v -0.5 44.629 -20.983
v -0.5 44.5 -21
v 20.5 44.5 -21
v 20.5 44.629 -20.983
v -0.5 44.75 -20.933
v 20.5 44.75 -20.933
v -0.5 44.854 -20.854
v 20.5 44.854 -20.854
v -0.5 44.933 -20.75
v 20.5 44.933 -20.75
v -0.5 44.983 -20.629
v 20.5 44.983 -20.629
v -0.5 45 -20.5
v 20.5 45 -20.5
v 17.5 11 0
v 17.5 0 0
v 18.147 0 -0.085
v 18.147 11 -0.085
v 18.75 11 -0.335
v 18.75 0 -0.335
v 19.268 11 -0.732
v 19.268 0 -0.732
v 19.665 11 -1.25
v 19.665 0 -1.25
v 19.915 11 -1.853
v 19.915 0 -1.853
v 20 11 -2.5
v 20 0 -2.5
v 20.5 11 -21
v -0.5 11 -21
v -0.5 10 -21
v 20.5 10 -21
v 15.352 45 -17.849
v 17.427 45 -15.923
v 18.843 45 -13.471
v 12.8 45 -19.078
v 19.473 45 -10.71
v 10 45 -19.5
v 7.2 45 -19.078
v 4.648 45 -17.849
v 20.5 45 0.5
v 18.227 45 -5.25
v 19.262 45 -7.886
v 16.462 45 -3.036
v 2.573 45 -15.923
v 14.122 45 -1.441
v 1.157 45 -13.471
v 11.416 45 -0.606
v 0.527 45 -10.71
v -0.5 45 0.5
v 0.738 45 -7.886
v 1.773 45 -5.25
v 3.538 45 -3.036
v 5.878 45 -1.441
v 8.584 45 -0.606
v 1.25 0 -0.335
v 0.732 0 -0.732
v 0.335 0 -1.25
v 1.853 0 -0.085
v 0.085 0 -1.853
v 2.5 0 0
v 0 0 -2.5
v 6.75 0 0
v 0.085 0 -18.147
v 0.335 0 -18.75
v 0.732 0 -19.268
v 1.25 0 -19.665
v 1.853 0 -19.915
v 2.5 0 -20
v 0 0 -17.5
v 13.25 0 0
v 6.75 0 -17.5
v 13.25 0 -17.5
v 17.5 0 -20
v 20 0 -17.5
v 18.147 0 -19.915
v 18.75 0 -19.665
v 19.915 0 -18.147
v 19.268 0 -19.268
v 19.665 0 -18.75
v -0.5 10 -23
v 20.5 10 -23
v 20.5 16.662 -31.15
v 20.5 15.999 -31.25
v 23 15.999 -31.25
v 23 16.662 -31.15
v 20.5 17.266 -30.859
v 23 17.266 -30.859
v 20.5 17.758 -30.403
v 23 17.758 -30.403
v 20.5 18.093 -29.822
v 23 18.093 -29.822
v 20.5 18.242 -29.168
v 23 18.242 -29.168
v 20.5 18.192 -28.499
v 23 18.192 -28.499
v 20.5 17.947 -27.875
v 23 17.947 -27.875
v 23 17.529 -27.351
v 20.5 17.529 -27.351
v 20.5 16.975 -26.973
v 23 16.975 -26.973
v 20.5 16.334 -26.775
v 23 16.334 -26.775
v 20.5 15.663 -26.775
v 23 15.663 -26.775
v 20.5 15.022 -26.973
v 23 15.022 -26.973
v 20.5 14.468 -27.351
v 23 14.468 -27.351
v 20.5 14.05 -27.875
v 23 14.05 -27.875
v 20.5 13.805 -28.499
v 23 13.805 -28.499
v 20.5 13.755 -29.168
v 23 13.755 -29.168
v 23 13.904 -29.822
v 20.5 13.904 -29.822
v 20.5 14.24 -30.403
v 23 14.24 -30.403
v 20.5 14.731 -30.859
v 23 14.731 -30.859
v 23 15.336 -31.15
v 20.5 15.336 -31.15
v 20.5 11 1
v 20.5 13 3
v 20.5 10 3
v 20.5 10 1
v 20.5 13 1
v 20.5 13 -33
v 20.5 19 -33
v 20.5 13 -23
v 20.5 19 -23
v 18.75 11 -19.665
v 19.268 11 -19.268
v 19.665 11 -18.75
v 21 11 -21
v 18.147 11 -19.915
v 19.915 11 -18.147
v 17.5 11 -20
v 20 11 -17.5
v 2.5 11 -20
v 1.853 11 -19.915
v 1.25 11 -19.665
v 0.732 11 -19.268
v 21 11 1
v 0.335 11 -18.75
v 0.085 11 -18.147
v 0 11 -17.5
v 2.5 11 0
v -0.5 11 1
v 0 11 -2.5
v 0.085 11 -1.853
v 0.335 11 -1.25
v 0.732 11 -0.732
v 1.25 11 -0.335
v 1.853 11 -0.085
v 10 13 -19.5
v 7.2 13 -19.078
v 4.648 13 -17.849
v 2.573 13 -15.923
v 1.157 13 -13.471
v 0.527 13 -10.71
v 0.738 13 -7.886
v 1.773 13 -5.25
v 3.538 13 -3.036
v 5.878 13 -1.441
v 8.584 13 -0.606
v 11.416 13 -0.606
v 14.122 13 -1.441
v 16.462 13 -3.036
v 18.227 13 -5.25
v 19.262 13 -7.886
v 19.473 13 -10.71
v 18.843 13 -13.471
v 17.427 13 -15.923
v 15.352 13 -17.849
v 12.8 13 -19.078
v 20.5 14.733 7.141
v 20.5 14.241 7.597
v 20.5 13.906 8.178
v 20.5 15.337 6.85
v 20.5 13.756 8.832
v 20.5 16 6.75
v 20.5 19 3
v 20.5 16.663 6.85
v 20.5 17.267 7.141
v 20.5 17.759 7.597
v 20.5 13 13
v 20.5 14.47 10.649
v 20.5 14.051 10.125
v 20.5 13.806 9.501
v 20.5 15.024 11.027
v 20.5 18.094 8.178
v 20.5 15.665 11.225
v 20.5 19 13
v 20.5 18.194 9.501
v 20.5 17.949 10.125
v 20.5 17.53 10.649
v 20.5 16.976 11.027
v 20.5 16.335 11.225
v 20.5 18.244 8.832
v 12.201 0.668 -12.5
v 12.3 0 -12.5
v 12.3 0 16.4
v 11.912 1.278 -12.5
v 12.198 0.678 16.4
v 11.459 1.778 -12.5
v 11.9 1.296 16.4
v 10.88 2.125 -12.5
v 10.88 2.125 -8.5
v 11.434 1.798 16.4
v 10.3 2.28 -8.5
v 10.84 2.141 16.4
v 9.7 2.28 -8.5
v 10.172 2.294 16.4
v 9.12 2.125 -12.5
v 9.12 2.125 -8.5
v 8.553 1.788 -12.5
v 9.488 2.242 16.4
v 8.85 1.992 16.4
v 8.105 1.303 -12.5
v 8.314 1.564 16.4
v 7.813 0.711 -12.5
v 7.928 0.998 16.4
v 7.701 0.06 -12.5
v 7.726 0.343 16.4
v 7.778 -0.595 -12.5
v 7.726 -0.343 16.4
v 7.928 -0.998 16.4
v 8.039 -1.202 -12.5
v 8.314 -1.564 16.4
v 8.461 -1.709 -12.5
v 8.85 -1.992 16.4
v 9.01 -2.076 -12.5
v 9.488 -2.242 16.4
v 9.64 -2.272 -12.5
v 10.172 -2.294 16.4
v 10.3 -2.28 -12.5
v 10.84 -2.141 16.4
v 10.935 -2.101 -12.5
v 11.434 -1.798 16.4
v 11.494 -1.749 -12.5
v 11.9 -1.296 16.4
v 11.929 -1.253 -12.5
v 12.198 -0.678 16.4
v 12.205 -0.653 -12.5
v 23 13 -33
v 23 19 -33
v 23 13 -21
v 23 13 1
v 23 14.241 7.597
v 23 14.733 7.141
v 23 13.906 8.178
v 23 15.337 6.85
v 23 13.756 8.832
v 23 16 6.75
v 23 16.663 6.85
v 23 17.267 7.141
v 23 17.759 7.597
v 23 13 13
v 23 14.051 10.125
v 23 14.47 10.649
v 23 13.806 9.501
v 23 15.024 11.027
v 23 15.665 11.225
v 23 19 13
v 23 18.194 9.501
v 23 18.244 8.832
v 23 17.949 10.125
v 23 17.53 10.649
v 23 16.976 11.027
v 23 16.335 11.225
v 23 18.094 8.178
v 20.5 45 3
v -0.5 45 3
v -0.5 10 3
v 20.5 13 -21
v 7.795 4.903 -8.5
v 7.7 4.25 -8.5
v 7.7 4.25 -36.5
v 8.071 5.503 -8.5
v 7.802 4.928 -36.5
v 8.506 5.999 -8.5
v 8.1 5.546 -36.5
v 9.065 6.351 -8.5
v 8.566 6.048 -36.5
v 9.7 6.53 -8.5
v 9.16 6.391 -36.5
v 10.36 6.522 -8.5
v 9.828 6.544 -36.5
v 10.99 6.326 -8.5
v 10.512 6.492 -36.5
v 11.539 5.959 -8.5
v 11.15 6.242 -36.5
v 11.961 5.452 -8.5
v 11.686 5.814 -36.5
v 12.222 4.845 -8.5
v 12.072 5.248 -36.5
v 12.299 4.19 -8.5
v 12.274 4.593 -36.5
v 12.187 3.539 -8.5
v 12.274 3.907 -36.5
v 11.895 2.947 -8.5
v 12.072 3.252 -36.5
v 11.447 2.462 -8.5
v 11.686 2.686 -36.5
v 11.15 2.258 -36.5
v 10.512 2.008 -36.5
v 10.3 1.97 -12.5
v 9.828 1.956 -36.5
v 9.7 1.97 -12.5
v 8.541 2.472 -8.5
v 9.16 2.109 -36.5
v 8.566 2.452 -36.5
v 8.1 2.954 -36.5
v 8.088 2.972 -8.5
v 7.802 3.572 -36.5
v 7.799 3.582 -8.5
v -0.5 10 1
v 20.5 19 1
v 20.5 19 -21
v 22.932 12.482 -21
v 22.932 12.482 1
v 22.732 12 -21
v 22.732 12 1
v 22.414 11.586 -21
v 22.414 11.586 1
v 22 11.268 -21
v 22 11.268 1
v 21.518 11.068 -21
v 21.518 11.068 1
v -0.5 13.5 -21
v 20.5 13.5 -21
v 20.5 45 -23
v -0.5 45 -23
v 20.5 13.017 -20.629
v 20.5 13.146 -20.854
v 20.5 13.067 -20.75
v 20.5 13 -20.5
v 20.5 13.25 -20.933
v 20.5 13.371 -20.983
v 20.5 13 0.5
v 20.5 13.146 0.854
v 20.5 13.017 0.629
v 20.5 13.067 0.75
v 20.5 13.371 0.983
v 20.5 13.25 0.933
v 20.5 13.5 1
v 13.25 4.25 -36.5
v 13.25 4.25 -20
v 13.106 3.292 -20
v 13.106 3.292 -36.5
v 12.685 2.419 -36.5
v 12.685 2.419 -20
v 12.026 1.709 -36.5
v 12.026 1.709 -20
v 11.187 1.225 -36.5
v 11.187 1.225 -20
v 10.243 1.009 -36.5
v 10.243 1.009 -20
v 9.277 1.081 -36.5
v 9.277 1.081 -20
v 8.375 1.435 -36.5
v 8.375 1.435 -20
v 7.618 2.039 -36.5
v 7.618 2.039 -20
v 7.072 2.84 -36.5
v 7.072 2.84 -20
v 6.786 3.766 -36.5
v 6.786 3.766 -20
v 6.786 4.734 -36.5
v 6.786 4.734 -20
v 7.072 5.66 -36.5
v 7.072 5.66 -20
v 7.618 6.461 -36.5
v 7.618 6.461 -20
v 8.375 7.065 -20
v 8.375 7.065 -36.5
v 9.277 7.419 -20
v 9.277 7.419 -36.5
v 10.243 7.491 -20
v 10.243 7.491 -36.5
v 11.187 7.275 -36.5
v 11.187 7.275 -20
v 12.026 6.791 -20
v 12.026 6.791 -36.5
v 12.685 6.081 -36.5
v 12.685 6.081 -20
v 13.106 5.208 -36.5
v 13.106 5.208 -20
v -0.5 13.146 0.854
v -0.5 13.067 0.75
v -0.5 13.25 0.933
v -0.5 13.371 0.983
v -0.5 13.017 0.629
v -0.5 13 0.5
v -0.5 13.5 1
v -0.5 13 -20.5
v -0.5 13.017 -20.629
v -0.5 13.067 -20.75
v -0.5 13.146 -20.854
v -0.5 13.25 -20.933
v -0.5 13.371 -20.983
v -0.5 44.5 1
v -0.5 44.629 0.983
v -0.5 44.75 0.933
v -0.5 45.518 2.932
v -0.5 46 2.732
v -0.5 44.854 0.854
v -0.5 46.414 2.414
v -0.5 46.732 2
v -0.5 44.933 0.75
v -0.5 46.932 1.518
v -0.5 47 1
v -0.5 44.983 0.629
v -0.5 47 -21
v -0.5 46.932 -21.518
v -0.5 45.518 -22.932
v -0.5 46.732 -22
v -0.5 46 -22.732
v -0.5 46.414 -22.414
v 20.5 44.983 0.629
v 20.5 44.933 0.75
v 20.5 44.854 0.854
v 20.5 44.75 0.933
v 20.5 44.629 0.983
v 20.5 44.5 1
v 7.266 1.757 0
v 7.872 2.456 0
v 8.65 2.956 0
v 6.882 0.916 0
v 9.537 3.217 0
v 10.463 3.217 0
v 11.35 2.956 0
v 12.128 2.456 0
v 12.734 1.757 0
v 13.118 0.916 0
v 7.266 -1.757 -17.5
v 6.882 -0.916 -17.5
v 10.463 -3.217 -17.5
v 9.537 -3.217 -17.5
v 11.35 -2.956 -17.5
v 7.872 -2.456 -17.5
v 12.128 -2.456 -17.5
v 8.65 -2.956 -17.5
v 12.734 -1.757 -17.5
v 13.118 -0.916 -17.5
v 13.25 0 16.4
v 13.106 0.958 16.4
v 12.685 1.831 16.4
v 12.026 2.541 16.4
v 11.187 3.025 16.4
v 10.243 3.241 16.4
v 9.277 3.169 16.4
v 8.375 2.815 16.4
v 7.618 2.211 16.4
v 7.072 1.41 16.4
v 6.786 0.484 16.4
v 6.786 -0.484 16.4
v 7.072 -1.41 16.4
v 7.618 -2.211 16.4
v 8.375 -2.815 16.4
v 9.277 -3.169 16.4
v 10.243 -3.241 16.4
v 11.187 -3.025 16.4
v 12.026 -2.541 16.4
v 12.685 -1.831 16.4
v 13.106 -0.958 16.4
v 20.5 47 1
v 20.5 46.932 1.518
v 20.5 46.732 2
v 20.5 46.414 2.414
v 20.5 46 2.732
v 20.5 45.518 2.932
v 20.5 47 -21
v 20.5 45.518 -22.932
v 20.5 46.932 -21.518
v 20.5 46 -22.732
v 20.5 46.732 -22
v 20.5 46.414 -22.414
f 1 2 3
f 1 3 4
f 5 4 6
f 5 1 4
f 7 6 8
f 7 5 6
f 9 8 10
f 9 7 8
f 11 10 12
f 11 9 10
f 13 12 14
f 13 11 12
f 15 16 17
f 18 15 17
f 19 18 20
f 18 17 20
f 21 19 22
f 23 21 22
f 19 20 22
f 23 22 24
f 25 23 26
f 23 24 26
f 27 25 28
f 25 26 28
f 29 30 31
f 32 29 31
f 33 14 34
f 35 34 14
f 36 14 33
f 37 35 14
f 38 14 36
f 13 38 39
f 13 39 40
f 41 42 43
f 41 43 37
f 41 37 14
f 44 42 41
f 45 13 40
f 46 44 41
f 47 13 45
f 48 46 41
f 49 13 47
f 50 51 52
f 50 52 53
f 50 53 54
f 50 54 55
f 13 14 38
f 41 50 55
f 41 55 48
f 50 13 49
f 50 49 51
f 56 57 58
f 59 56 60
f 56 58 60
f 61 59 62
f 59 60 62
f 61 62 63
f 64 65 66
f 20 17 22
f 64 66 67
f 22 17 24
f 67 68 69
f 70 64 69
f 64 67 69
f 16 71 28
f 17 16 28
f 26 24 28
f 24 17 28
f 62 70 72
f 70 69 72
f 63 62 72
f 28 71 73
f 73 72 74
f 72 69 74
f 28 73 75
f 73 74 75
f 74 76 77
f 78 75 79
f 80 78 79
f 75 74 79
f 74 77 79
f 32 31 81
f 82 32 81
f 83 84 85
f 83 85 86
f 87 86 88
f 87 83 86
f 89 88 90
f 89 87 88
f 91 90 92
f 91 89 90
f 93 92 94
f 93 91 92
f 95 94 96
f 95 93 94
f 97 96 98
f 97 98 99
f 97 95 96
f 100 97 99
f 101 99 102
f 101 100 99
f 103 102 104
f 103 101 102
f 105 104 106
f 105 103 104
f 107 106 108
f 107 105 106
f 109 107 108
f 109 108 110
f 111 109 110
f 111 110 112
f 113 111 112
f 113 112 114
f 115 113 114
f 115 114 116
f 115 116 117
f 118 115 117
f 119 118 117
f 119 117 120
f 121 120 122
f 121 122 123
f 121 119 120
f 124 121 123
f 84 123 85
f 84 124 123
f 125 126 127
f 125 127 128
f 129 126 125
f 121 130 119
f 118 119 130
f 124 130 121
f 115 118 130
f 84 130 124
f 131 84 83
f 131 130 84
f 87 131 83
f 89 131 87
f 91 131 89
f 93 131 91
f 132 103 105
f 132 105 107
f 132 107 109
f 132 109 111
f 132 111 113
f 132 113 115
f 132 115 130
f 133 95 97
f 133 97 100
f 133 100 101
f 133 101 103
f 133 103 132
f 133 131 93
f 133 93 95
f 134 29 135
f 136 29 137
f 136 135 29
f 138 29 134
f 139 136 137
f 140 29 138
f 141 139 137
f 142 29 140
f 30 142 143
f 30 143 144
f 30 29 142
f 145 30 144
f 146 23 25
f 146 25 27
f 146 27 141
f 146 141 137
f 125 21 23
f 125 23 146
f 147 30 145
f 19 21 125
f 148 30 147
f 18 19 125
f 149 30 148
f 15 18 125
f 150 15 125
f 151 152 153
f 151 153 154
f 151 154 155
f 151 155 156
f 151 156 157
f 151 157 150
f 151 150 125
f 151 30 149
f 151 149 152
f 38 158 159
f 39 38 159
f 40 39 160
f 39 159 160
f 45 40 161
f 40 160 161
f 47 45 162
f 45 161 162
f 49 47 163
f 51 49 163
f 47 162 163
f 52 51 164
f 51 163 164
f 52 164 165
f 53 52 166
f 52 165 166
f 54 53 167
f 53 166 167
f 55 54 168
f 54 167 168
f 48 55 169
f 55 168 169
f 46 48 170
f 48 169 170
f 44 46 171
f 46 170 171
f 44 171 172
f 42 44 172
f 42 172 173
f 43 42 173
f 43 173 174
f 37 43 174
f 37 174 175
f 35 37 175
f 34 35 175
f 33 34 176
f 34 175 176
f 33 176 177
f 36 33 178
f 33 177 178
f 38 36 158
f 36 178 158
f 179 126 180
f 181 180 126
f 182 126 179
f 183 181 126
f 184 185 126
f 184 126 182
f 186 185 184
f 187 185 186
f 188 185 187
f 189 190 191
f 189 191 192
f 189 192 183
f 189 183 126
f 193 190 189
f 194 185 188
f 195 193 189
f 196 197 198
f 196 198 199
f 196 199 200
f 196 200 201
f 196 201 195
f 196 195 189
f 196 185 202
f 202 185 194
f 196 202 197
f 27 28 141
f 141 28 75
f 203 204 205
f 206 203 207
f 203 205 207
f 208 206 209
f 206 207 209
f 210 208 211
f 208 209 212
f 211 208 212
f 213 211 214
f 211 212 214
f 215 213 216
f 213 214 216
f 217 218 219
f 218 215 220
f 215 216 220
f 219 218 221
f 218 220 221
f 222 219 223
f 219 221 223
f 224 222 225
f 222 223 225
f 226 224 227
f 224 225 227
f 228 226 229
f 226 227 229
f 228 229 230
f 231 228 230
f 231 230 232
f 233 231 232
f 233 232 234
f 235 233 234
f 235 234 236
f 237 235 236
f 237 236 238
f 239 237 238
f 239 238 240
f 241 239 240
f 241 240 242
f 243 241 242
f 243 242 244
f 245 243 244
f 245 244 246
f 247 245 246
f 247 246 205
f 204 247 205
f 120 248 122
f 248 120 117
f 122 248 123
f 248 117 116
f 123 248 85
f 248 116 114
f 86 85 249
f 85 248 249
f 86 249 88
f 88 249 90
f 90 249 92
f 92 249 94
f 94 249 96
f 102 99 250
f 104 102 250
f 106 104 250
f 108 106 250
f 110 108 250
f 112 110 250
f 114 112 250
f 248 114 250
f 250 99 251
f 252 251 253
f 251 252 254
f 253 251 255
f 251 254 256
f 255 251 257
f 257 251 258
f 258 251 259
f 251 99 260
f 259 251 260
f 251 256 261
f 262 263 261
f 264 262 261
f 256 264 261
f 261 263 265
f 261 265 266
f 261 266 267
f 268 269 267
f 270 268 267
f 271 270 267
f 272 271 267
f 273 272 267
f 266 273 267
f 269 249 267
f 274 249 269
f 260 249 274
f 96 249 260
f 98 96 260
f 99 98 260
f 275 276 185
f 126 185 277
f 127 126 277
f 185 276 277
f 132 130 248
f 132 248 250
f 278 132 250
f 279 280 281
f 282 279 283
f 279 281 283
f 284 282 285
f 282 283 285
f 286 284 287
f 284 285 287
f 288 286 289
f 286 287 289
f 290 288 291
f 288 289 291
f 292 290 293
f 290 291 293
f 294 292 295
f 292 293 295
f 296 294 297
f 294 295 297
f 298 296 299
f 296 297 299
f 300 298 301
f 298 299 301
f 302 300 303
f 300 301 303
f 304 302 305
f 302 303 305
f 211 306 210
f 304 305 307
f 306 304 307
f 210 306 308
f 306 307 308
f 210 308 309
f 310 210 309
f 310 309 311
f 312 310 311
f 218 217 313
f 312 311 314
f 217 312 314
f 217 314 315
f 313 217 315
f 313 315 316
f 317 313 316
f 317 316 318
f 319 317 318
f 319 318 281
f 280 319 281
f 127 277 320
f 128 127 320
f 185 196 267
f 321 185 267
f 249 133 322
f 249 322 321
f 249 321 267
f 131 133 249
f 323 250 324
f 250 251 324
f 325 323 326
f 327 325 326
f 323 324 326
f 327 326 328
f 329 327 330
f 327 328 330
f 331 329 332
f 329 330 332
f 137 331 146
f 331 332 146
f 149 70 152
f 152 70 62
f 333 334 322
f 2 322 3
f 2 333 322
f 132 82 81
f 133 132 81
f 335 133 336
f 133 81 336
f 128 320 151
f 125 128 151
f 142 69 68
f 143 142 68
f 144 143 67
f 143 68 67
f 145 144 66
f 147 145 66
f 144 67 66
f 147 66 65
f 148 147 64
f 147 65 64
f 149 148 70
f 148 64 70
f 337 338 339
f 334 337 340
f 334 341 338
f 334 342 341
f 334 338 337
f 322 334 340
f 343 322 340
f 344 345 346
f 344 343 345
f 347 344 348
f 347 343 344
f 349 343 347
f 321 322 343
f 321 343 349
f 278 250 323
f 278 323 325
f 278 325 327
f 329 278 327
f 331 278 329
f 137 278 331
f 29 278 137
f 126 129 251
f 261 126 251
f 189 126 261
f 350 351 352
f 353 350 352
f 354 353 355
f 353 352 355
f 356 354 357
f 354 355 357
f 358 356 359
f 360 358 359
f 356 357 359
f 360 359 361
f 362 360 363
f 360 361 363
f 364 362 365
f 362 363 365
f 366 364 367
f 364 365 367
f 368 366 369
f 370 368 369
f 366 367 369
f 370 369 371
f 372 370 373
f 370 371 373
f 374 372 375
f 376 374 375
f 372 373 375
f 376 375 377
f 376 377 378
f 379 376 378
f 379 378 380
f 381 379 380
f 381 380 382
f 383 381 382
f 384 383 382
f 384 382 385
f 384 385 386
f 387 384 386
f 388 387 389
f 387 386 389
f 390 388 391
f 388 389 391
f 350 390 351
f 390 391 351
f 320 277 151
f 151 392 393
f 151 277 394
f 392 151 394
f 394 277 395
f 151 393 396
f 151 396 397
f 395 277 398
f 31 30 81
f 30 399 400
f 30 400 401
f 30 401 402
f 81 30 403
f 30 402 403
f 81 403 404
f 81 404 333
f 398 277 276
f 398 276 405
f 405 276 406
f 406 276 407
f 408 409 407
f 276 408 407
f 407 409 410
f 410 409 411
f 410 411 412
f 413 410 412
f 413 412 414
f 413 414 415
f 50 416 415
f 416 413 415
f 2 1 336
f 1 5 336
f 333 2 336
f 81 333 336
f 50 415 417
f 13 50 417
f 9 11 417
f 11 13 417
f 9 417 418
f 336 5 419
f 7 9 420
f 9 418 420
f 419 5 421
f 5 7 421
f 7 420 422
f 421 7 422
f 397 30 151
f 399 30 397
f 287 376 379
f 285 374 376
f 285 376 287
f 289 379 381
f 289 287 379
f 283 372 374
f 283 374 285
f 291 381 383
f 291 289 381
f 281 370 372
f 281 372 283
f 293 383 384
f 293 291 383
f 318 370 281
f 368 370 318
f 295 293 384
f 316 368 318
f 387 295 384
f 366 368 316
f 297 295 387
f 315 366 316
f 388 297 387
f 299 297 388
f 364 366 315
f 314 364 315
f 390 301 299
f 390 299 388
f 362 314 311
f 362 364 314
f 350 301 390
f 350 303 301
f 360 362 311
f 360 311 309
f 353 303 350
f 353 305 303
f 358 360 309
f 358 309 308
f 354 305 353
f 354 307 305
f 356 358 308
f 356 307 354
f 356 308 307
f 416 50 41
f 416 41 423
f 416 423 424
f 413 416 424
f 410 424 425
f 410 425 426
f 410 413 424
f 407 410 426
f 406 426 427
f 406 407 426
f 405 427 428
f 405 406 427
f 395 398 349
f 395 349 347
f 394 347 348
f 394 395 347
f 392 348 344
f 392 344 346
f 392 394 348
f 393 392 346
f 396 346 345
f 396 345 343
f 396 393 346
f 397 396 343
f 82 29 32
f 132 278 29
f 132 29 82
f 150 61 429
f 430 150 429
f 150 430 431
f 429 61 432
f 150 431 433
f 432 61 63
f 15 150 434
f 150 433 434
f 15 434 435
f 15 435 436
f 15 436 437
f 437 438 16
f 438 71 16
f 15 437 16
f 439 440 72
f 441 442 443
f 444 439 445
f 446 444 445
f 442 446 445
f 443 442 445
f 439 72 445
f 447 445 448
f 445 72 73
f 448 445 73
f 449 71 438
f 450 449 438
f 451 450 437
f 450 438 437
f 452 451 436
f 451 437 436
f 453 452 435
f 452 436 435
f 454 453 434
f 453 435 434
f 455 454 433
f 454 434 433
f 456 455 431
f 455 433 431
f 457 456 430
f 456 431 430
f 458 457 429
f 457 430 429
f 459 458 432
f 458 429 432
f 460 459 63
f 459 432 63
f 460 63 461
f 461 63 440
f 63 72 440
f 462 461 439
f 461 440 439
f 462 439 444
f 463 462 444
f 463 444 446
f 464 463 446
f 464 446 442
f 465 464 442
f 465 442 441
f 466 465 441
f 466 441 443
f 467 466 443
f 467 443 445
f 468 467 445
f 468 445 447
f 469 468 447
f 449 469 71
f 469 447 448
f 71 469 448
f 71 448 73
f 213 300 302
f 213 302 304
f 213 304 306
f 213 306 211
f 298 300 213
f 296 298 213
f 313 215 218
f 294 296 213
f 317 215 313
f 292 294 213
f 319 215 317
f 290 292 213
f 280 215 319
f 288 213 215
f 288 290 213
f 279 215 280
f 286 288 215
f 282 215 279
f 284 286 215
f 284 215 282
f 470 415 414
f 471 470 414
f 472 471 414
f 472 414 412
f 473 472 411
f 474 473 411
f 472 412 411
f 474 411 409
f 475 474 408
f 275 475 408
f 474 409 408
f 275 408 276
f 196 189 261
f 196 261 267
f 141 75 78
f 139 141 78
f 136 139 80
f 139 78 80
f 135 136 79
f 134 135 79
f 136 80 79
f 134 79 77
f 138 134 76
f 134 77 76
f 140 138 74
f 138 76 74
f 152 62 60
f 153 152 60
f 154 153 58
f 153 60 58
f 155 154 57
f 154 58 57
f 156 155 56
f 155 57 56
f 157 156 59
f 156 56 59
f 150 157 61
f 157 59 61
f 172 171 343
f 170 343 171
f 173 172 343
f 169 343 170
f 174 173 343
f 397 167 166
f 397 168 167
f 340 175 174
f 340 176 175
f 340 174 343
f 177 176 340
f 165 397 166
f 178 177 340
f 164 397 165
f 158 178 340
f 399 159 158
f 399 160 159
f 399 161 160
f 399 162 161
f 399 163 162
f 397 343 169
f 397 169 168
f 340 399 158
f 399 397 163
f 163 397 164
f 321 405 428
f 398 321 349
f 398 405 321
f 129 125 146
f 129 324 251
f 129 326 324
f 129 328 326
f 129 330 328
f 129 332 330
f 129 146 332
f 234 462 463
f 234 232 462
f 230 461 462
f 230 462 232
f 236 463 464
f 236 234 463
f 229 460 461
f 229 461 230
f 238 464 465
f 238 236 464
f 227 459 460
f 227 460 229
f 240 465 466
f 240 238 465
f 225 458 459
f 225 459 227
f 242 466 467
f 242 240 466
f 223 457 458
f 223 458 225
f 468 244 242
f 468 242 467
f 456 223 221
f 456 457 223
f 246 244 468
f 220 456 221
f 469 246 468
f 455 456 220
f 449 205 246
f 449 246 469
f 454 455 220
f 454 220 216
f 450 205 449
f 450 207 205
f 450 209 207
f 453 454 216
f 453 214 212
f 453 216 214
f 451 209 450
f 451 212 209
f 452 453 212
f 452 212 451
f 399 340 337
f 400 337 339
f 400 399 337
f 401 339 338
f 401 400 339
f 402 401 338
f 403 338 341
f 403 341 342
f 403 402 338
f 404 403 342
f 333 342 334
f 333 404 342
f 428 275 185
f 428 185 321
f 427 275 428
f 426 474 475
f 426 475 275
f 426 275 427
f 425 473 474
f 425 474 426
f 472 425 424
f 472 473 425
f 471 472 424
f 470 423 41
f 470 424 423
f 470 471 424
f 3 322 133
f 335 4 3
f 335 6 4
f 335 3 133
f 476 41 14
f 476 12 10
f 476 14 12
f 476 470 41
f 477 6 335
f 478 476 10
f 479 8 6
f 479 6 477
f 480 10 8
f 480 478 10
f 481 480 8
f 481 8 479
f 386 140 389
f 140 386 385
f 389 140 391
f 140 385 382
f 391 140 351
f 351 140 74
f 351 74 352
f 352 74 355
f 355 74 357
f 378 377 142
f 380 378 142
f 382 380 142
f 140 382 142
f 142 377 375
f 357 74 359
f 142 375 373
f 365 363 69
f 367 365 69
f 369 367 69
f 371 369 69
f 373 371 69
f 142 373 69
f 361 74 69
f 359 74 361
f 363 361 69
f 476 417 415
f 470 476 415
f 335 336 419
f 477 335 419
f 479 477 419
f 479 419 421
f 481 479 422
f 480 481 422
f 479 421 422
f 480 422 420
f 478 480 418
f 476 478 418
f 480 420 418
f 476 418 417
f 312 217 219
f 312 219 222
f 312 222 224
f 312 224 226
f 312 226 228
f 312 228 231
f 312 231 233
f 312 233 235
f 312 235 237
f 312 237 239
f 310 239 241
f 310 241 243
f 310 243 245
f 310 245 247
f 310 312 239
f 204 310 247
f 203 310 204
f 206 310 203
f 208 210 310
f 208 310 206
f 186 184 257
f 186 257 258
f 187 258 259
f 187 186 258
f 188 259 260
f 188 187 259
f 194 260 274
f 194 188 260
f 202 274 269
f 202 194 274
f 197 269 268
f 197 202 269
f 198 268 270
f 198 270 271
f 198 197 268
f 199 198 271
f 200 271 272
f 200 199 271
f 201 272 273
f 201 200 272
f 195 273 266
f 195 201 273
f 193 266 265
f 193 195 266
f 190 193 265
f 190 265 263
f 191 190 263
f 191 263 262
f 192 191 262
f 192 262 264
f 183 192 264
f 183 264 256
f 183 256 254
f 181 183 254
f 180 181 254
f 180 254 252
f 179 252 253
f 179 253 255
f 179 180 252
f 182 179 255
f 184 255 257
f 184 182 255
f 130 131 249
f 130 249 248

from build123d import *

# Parameters (mm, degrees)
BOSS_EXTRUDE1_DEPTH      = 11
BOSS_EXTRUDE2_DEPTH      = 16.4
BOSS_EXTRUDE2_DEPTH_BACK = 17.5
SKETCH2_R                = 3.25
SKETCH3_R                = 2.3
CUT_EXTRUDE1_DEPTH       = 28.9
SKETCH4_R                = 3.25
BOSS_EXTRUDE3_DEPTH      = 16.5
SKETCH5_R                = 2.3
CUT_EXTRUDE2_DEPTH       = 28
BOSS_EXTRUDE4_START      = -20.5
BOSS_EXTRUDE4_DEPTH      = 21
SKETCH8_R                = 9.5
BOSS_EXTRUDE5_DEPTH      = 32
SKETCH10_R               = 2.25
BOSS_EXTRUDE6_DEPTH      = 2.5
FILLET1_R                = 2


with BuildPart() as part:
    # Sketch1 → Boss-Extrude1 (new body)
    with BuildSketch(Plane(origin=(0, 0, 0), x_dir=(1, 0, 0), z_dir=(0, 1, 0))):
        with BuildLine():
            Line((2.5, 0), (17.5, 0))
            ThreePointArc((17.5, 0), (19.267766953, 0.732233047), (20, 2.5))
            Line((20, 2.5), (20, 17.5))
            ThreePointArc((20, 17.5), (19.267766953, 19.267766953), (17.5, 20))
            Line((17.5, 20), (2.5, 20))
            ThreePointArc((2.5, 20), (0.732233047, 19.267766953), (0, 17.5))
            Line((0, 17.5), (0, 2.5))
            ThreePointArc((0, 2.5), (0.732233047, 0.732233047), (2.5, 0))
        make_face()
    extrude(amount=BOSS_EXTRUDE1_DEPTH)

    # Sketch2 → Boss-Extrude2 (add, two sides: drawn at the far end of the back side and taken through both)
    with BuildSketch(Plane.XY.offset(-BOSS_EXTRUDE2_DEPTH_BACK)):
        with Locations((10, 0)):
            Circle(SKETCH2_R)
    extrude(amount=BOSS_EXTRUDE2_DEPTH + BOSS_EXTRUDE2_DEPTH_BACK)

    # Sketch3 → Cut-Extrude1 (cut)
    with BuildSketch(Plane.XY.offset(16.4)):
        with Locations((10, 0)):
            Circle(SKETCH3_R)
    extrude(amount=-CUT_EXTRUDE1_DEPTH, mode=Mode.SUBTRACT)

    # Sketch4 → Boss-Extrude3 (add)
    with BuildSketch(Plane(origin=(0, 0, -20), x_dir=(-1, 0, 0), z_dir=(0, 0, -1))):
        with Locations(Location((-10, 4.25, 0), (0, 0, 180))):
            Circle(SKETCH4_R)
    extrude(amount=BOSS_EXTRUDE3_DEPTH)

    # Sketch5 → Cut-Extrude2 (cut)
    with BuildSketch(Plane(origin=(0, 0, -36.5), x_dir=(-1, 0, 0), z_dir=(0, 0, -1))):
        with Locations((-10, 4.25)):
            Circle(SKETCH5_R)
    extrude(amount=-CUT_EXTRUDE2_DEPTH, mode=Mode.SUBTRACT)

    # Sketch7 → Boss-Extrude4 (add)
    with BuildSketch(Plane(origin=(20, 0, 0), x_dir=(0, 0, -1), z_dir=(1, 0, 0)).offset(BOSS_EXTRUDE4_START)):
        with BuildLine():
            Line((-1, 11), (21, 11))
            Line((21, 11), (21, 10))
            Line((21, 10), (23, 10))
            Line((23, 10), (23, 45))
            ThreePointArc((23, 45), (22.414213562, 46.414213562), (21, 47))
            Line((21, 47), (-1, 47))
            ThreePointArc((-1, 47), (-2.414213562, 46.414213562), (-3, 45))
            Line((-3, 45), (-3, 10))
            Line((-3, 10), (-1, 10))
            Line((-1, 10), (-1, 11))
        make_face()
        with BuildLine():
            Line((-0.5, 13), (20.5, 13))
            ThreePointArc((20.5, 13), (20.853553391, 13.146446609), (21, 13.5))
            Line((21, 13.5), (21, 44.5))
            ThreePointArc((21, 44.5), (20.853553391, 44.853553391), (20.5, 45))
            Line((20.5, 45), (-0.5, 45))
            ThreePointArc((-0.5, 45), (-0.853553391, 44.853553391), (-1, 44.5))
            Line((-1, 44.5), (-1, 13.5))
            ThreePointArc((-1, 13.5), (-0.853553391, 13.146446609), (-0.5, 13))
        make_face(mode=Mode.SUBTRACT)
    extrude(amount=BOSS_EXTRUDE4_DEPTH)

    # Sketch8 → Boss-Extrude5 (add)
    with BuildSketch(Plane(origin=(0, 13, 0), x_dir=(1, 0, 0), z_dir=(0, 1, 0))):
        with Locations(Location((10, 10, 0), (0, 0, 90))):
            Circle(SKETCH8_R)
    extrude(amount=BOSS_EXTRUDE5_DEPTH)

    # Sketch10 → Boss-Extrude6 (add)
    with BuildSketch(Plane(origin=(20.5, 0, 0), x_dir=(0, 0, -1), z_dir=(1, 0, 0))):
        Polygon((-13, 19), (33, 19), (33, 13), (21, 13), (21, 11), (-1, 11), (-1, 13), (-13, 13), align=None)
        with Locations((-9, 16)):
            Circle(SKETCH10_R, mode=Mode.SUBTRACT)
        with Locations((28.999999979, 15.998723468)):
            Circle(SKETCH10_R, mode=Mode.SUBTRACT)
    extrude(amount=BOSS_EXTRUDE6_DEPTH)

    # Fillet1
    fillet1_edges = [part.edges().sort_by_distance(p)[0] for p in [
        (23, 11, -10),
    ]]
    fillet(fillet1_edges, radius=FILLET1_R)


solid = part.part
